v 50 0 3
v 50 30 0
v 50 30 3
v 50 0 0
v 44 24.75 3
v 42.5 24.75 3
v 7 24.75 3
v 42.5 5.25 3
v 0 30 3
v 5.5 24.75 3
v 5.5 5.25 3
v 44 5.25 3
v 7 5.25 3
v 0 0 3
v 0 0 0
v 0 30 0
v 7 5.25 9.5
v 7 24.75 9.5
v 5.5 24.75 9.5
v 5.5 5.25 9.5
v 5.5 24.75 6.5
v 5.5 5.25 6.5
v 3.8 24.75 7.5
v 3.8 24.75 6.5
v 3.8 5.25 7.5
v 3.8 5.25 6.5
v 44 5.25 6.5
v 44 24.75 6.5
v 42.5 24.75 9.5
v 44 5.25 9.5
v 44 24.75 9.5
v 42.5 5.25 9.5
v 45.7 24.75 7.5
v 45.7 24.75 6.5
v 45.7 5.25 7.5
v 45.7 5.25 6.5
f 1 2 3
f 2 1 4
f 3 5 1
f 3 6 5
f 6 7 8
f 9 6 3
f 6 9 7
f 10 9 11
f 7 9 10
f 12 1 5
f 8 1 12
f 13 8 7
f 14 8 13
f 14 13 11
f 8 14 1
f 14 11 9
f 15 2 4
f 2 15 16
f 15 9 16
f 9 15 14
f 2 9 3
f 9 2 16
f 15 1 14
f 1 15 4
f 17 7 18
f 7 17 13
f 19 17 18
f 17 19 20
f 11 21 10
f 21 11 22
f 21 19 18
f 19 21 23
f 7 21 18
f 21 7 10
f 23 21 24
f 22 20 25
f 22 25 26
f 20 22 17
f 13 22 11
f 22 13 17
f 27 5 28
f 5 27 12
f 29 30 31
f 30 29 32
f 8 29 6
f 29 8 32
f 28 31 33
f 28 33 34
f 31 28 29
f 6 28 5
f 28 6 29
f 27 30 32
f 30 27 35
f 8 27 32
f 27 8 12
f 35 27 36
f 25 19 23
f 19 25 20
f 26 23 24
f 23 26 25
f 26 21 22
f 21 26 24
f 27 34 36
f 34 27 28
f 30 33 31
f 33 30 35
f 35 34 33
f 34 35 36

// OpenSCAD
// file: utils.scad
function CENTER(parentCoordinate, childCoordinate) = 
    parentCoordinate / 2 - childCoordinate / 2;
// main file
use <./utils.scad>

width = 50;
height = 30;
thickness = 3;
tollerance = 0.5;

edgeWidth = 10;

holeWidth = width - edgeWidth;
holeHeight = height - edgeWidth;

femaleClip(holeWidth, holeHeight, thickness);
!maleClip(width, height, holeHeight, thickness, edgeWidth);


module femaleClip(holeWidth, holeHeight, thickness) {
    difference() {
    translate([0,0,thickness]) cube([width, height, thickness]);
    translate([CENTER(width, holeWidth), CENTER(height, holeHeight), thickness]) cube([holeWidth, holeHeight, thickness]);
    }
}

module maleClip(width, height, holeHeight, thickness, edgeWidth) {
    cube([width, height, thickness]);
    clipHeight = holeHeight - tollerance;
    clipWidth = thickness*.5;
    clipDepth = thickness *2 + tollerance;

    translate([edgeWidth/2+tollerance, CENTER(height, clipHeight),thickness]) cube([clipWidth, clipHeight, clipDepth]);
    translate([width-edgeWidth/2-1-clipWidth, CENTER(height, clipHeight),thickness]) cube([clipWidth, clipHeight, clipDepth]);
    translate([edgeWidth/2+tollerance, CENTER(height, clipHeight)+clipHeight, clipDepth]) rotate(180) {
        clipExtension(clipHeight, thickness, 1.7, 1);
    }

    translate([width-edgeWidth/2-1, CENTER(height, clipHeight),clipDepth]) 
    clipExtension(clipHeight, thickness, 1.7, 1);
}

module clipExtension(width, height, depth, edge) {
    rotate([90,0,0]) {
        translate([0,0,-width]) linear_extrude(height=width) polygon([
            [0, 0],
            [0, height],
            [depth, edge],
            [depth, 0],
            [0, 0],
        ]);
    }
}
